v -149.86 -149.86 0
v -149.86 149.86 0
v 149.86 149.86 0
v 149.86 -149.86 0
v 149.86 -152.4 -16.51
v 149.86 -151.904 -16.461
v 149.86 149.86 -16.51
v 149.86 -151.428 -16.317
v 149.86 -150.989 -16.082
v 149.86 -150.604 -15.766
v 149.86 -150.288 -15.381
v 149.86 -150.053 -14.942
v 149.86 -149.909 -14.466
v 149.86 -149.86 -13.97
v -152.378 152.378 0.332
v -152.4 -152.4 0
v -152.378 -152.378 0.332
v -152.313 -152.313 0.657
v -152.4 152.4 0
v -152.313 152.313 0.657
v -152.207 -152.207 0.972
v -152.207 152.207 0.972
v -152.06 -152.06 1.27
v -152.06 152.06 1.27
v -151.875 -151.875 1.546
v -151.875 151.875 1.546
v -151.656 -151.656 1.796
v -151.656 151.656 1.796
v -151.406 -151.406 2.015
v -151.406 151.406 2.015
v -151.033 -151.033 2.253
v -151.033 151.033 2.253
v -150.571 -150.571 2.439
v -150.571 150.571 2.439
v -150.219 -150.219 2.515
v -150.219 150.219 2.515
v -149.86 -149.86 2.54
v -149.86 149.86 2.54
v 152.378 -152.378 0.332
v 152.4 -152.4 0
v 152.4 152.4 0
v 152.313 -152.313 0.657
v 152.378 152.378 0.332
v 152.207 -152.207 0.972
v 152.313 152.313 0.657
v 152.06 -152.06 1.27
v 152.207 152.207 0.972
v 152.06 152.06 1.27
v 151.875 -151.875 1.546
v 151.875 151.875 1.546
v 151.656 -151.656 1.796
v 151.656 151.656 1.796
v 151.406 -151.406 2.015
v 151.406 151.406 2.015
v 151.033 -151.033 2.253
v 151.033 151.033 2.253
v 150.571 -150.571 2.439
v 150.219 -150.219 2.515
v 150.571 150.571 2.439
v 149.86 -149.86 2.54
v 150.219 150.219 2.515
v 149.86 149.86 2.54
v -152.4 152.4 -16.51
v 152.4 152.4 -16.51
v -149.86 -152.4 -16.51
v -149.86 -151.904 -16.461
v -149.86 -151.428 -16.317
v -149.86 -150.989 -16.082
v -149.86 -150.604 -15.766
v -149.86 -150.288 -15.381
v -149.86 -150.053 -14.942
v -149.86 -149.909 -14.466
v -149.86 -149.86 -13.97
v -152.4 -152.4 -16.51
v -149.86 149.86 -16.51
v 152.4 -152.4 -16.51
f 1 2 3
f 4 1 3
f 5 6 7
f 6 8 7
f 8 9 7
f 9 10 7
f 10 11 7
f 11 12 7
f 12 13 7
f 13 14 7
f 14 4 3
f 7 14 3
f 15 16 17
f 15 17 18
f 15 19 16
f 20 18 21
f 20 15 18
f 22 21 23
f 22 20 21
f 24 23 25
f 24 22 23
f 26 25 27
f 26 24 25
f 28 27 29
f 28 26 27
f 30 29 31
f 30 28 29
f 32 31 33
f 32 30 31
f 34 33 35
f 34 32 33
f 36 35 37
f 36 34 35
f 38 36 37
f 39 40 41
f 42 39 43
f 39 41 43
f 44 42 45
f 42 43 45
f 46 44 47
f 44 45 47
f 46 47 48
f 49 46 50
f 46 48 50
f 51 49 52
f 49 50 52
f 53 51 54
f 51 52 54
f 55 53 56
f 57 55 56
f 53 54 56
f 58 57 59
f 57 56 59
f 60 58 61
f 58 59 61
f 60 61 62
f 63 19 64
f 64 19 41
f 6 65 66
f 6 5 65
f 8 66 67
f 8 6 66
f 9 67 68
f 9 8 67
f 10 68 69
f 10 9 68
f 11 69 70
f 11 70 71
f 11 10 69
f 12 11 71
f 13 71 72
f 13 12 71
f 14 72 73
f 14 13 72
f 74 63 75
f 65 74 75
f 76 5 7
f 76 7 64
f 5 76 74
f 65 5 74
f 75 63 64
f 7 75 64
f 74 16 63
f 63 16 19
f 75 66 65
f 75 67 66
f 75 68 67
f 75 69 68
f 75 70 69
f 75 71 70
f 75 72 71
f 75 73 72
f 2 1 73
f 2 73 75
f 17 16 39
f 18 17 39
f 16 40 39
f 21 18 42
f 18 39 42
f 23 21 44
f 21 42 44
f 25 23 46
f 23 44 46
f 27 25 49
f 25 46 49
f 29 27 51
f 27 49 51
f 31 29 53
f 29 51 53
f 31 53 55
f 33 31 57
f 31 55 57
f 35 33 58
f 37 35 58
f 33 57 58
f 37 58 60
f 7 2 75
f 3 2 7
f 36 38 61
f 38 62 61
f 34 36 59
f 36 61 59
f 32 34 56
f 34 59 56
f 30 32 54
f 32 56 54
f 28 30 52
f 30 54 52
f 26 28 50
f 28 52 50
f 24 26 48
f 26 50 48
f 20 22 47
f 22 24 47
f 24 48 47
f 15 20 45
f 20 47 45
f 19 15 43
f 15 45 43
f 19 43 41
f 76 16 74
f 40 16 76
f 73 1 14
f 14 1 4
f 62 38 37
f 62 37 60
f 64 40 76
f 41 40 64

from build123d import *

# Parameters (mm, degrees)
SKETCH1_W           = 304.8
SKETCH1_H           = 304.8
BOSS_EXTRUDE1_DEPTH = 2.54
SKETCH2_W           = 304.8
SKETCH2_H           = 304.8
SKETCH2_W_2         = 299.72
SKETCH2_H_2         = 299.72
BOSS_EXTRUDE2_DEPTH = 19.05
FILLET1_R           = 2.54


with BuildPart() as part:
    # Sketch1 → Boss-Extrude1 (new body)
    with BuildSketch(Plane.XY):
        Rectangle(SKETCH1_W, SKETCH1_H)
    extrude(amount=BOSS_EXTRUDE1_DEPTH)

    # Sketch2 → Boss-Extrude2 (add)
    with BuildSketch(Plane.XY.offset(2.54)):
        Rectangle(SKETCH2_W, SKETCH2_H)
        Rectangle(SKETCH2_W_2, SKETCH2_H_2, mode=Mode.SUBTRACT)
    extrude(amount=-BOSS_EXTRUDE2_DEPTH)

    # Fillet1
    fillet1_edges = [part.edges().sort_by_distance(p)[0] for p in [
        (-152.4, 0, 2.54),
        (0, -152.4, 2.54),
        (0, -149.86, -16.51),
        (152.4, 0, 2.54),
        (0, 152.4, 2.54),
    ]]
    fillet(fillet1_edges, radius=FILLET1_R - 0.0001)  # a hair under: the kernel refuses the full size


solid = part.part
